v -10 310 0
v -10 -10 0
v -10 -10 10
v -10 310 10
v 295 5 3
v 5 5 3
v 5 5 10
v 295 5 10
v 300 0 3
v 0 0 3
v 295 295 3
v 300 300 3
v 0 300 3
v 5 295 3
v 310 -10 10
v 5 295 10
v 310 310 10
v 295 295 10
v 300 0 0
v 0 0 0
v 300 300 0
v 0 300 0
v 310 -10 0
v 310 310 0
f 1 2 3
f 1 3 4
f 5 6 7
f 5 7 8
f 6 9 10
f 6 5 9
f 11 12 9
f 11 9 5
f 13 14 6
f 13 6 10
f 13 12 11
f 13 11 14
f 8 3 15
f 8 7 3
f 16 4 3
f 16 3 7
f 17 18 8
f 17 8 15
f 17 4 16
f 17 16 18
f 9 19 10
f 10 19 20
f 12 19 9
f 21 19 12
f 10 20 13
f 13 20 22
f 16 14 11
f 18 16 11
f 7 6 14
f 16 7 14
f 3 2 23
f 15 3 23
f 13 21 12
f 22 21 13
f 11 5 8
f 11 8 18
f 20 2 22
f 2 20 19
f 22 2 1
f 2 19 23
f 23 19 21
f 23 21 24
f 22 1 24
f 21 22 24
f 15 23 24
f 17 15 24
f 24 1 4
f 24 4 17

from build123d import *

# Parameters (mm, degrees)
CROQUIS1_W              = 320
CROQUIS1_H              = 320
CROQUIS1_W_2            = 290
CROQUIS1_H_2            = 290
SALIENTE_EXTRUIR1_DEPTH = 10
CROQUIS2_W              = 300
CROQUIS2_H              = 300
CORTAR_EXTRUIR1_DEPTH   = 3


with BuildPart() as part:
    # Croquis1 → Saliente-Extruir1 (new body)
    with BuildSketch(Plane.XY):
        with Locations((150, 150)):
            Rectangle(CROQUIS1_W, CROQUIS1_H)
        with Locations((150, 150)):
            Rectangle(CROQUIS1_W_2, CROQUIS1_H_2, mode=Mode.SUBTRACT)
    extrude(amount=SALIENTE_EXTRUIR1_DEPTH)

    # Croquis2 → Cortar-Extruir1 (cut)
    with BuildSketch(Plane(origin=(0, 0, 0), x_dir=(-1, 0, 0), z_dir=(0, 0, -1))):
        with Locations((-150, 150)):
            Rectangle(CROQUIS2_W, CROQUIS2_H)
    extrude(amount=-CORTAR_EXTRUIR1_DEPTH, mode=Mode.SUBTRACT)


solid = part.part
